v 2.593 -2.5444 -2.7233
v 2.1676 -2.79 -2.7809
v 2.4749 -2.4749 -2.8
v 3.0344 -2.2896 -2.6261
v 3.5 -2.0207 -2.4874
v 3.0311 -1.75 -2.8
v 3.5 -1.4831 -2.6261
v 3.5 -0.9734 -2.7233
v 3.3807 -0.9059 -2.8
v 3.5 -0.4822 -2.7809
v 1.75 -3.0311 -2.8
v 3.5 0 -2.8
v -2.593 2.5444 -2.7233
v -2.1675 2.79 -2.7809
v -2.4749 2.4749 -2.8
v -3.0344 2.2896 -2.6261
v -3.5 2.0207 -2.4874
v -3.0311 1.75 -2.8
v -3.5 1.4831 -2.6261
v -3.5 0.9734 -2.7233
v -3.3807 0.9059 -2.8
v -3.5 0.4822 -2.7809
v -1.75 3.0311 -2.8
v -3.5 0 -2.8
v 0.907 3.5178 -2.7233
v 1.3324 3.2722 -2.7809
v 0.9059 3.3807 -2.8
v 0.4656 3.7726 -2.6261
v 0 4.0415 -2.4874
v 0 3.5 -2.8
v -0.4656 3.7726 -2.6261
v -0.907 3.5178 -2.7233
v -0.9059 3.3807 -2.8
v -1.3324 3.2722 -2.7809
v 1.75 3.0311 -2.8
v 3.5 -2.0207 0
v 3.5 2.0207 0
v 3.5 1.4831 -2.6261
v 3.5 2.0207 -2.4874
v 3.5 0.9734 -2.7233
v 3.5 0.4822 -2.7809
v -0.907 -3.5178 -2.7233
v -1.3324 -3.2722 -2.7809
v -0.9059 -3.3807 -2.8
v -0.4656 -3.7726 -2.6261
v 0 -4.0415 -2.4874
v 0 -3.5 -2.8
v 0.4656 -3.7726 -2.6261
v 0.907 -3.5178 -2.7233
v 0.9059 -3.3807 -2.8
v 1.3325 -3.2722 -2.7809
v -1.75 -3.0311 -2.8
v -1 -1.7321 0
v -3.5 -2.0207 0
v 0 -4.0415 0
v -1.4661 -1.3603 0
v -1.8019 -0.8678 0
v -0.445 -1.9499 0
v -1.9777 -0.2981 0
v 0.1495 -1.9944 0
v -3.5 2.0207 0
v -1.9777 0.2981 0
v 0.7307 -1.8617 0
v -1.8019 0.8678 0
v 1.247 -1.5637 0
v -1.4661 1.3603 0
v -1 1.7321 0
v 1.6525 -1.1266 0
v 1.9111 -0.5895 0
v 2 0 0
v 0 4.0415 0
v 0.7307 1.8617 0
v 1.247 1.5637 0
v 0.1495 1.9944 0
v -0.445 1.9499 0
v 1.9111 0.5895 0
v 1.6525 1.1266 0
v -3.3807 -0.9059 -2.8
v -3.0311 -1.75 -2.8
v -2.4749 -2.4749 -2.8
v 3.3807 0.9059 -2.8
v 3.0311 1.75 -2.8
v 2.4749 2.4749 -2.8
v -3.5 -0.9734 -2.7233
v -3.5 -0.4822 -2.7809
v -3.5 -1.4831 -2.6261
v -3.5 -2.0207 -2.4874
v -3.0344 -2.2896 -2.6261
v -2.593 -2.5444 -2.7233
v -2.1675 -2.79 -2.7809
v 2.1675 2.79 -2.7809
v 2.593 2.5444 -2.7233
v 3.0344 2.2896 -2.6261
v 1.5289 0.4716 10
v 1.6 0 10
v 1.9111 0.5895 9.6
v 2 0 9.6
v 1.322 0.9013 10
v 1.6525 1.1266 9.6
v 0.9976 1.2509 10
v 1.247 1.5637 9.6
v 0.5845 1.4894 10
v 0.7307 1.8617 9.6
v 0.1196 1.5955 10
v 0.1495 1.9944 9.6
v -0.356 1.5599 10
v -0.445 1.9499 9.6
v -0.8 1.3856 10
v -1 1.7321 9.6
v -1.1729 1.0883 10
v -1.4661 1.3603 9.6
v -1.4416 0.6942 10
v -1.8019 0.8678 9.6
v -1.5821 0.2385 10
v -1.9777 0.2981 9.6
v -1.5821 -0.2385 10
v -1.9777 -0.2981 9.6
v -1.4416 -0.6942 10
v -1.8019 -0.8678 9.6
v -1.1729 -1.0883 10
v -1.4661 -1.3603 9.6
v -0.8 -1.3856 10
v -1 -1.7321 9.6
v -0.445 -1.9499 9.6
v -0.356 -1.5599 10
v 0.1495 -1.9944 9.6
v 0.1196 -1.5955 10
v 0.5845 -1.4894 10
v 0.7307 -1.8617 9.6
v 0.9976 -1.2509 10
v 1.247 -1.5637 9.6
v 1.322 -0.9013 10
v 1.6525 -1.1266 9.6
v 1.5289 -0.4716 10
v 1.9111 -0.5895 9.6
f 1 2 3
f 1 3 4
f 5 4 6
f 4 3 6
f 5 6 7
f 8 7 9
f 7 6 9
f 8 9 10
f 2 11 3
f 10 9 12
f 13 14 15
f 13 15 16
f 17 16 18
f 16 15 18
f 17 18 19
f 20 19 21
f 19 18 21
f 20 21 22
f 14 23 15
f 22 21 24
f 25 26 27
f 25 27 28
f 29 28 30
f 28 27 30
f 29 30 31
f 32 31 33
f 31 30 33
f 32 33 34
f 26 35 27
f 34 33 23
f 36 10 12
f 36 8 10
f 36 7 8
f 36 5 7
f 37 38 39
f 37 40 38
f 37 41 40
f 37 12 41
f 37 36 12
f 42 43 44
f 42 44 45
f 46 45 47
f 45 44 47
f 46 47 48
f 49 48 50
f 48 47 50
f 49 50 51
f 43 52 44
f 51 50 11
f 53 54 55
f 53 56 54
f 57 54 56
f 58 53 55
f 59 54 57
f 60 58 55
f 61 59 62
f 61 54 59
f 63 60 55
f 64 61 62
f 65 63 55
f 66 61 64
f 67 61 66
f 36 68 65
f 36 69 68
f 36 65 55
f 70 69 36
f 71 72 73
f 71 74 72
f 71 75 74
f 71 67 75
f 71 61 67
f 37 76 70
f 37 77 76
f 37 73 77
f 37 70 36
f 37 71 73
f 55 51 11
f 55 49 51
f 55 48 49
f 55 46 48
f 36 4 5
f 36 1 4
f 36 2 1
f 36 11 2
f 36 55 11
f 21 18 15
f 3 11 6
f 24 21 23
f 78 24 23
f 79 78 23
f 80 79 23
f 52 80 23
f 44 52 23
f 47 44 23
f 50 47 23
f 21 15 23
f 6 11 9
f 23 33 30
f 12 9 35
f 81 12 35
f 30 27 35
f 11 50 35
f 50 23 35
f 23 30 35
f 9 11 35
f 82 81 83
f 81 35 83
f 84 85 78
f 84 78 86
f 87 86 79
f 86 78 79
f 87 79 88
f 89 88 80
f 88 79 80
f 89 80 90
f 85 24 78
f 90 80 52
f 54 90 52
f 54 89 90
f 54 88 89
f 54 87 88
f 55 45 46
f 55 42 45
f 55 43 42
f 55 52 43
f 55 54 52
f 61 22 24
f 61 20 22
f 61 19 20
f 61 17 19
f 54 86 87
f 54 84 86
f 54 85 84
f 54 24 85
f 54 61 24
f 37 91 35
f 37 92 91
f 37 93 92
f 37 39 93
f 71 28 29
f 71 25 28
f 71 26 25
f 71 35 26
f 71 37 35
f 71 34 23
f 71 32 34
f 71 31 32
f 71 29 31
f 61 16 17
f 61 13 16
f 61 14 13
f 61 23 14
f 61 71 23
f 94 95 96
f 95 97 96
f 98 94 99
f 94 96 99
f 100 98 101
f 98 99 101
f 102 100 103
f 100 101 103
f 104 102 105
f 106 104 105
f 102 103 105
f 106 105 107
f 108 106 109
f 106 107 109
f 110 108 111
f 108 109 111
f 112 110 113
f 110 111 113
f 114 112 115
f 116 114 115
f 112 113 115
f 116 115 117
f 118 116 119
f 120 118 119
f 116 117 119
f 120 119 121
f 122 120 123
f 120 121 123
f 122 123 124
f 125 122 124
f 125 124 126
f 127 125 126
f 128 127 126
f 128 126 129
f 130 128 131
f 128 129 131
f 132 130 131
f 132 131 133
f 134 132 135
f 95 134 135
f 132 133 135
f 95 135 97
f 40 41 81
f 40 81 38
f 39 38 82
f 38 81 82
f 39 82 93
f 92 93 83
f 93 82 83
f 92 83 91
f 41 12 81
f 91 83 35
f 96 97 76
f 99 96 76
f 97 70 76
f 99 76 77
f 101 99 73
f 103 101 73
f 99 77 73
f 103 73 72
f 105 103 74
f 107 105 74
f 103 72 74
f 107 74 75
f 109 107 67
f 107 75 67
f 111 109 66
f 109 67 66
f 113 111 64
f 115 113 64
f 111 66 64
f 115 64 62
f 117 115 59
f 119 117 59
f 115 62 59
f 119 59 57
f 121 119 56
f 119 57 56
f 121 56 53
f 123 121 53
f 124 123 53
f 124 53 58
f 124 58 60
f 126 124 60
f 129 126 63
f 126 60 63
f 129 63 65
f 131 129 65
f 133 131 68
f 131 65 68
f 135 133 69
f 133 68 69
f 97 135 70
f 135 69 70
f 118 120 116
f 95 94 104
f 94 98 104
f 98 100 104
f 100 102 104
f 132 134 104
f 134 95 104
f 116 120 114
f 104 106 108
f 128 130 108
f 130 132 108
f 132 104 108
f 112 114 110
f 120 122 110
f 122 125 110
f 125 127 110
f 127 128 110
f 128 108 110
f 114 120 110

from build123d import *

# Parameters (mm, degrees)
ESQUISSE1_W        = 2
ESQUISSE1_H        = 10
BOSS_EXTRU_1_DEPTH = 2.8


with BuildPart() as part:
    # Esquisse1 → Base-Révolution (revolve)
    with BuildSketch(Plane(origin=(0, 0, 0), x_dir=(1, 0, 0), z_dir=(0, 1, 0))):
        with Locations((1, -5)):
            Rectangle(ESQUISSE1_W, ESQUISSE1_H)
    revolve(axis=Axis((0, 0, 0), (0, 0, 1)))

    # Chanfrein1: read off the stored shape, not the designer's step
    # Chanfrein1 outline → Chanfrein1 (revolve, cut)
    with BuildSketch(Plane.XZ):
        Polygon((2, 10), (1.6, 10), (2, 9.6), align=None)
    revolve(axis=Axis((0, 0, 0), (0, 0, 1)), mode=Mode.SUBTRACT)

    # Esquisse6 → Boss.-Extru.1 (add)
    with BuildSketch(Plane.XY):
        Polygon((3.5, -2.020725942), (3.5, 2.020725942), (0, 4.041451884), (-3.5, 2.020725942), (-3.5, -2.020725942), (0, -4.041451884), align=None)
    extrude(amount=-BOSS_EXTRU_1_DEPTH)

    # Esquisse7 → Enlèvement de matière-Révolution1 (revolve, cut)
    with BuildSketch(Plane(origin=(0, 0, 0), x_dir=(1, 0, 0), z_dir=(0, 1, 0))):
        Polygon((-3.5, 2.8), (-8.349742261, 2.8), (-8.349742261, 0), align=None)
    revolve(axis=Axis((0, 0, -6.239446496), (0, 0, 1)), mode=Mode.SUBTRACT)


solid = part.part
